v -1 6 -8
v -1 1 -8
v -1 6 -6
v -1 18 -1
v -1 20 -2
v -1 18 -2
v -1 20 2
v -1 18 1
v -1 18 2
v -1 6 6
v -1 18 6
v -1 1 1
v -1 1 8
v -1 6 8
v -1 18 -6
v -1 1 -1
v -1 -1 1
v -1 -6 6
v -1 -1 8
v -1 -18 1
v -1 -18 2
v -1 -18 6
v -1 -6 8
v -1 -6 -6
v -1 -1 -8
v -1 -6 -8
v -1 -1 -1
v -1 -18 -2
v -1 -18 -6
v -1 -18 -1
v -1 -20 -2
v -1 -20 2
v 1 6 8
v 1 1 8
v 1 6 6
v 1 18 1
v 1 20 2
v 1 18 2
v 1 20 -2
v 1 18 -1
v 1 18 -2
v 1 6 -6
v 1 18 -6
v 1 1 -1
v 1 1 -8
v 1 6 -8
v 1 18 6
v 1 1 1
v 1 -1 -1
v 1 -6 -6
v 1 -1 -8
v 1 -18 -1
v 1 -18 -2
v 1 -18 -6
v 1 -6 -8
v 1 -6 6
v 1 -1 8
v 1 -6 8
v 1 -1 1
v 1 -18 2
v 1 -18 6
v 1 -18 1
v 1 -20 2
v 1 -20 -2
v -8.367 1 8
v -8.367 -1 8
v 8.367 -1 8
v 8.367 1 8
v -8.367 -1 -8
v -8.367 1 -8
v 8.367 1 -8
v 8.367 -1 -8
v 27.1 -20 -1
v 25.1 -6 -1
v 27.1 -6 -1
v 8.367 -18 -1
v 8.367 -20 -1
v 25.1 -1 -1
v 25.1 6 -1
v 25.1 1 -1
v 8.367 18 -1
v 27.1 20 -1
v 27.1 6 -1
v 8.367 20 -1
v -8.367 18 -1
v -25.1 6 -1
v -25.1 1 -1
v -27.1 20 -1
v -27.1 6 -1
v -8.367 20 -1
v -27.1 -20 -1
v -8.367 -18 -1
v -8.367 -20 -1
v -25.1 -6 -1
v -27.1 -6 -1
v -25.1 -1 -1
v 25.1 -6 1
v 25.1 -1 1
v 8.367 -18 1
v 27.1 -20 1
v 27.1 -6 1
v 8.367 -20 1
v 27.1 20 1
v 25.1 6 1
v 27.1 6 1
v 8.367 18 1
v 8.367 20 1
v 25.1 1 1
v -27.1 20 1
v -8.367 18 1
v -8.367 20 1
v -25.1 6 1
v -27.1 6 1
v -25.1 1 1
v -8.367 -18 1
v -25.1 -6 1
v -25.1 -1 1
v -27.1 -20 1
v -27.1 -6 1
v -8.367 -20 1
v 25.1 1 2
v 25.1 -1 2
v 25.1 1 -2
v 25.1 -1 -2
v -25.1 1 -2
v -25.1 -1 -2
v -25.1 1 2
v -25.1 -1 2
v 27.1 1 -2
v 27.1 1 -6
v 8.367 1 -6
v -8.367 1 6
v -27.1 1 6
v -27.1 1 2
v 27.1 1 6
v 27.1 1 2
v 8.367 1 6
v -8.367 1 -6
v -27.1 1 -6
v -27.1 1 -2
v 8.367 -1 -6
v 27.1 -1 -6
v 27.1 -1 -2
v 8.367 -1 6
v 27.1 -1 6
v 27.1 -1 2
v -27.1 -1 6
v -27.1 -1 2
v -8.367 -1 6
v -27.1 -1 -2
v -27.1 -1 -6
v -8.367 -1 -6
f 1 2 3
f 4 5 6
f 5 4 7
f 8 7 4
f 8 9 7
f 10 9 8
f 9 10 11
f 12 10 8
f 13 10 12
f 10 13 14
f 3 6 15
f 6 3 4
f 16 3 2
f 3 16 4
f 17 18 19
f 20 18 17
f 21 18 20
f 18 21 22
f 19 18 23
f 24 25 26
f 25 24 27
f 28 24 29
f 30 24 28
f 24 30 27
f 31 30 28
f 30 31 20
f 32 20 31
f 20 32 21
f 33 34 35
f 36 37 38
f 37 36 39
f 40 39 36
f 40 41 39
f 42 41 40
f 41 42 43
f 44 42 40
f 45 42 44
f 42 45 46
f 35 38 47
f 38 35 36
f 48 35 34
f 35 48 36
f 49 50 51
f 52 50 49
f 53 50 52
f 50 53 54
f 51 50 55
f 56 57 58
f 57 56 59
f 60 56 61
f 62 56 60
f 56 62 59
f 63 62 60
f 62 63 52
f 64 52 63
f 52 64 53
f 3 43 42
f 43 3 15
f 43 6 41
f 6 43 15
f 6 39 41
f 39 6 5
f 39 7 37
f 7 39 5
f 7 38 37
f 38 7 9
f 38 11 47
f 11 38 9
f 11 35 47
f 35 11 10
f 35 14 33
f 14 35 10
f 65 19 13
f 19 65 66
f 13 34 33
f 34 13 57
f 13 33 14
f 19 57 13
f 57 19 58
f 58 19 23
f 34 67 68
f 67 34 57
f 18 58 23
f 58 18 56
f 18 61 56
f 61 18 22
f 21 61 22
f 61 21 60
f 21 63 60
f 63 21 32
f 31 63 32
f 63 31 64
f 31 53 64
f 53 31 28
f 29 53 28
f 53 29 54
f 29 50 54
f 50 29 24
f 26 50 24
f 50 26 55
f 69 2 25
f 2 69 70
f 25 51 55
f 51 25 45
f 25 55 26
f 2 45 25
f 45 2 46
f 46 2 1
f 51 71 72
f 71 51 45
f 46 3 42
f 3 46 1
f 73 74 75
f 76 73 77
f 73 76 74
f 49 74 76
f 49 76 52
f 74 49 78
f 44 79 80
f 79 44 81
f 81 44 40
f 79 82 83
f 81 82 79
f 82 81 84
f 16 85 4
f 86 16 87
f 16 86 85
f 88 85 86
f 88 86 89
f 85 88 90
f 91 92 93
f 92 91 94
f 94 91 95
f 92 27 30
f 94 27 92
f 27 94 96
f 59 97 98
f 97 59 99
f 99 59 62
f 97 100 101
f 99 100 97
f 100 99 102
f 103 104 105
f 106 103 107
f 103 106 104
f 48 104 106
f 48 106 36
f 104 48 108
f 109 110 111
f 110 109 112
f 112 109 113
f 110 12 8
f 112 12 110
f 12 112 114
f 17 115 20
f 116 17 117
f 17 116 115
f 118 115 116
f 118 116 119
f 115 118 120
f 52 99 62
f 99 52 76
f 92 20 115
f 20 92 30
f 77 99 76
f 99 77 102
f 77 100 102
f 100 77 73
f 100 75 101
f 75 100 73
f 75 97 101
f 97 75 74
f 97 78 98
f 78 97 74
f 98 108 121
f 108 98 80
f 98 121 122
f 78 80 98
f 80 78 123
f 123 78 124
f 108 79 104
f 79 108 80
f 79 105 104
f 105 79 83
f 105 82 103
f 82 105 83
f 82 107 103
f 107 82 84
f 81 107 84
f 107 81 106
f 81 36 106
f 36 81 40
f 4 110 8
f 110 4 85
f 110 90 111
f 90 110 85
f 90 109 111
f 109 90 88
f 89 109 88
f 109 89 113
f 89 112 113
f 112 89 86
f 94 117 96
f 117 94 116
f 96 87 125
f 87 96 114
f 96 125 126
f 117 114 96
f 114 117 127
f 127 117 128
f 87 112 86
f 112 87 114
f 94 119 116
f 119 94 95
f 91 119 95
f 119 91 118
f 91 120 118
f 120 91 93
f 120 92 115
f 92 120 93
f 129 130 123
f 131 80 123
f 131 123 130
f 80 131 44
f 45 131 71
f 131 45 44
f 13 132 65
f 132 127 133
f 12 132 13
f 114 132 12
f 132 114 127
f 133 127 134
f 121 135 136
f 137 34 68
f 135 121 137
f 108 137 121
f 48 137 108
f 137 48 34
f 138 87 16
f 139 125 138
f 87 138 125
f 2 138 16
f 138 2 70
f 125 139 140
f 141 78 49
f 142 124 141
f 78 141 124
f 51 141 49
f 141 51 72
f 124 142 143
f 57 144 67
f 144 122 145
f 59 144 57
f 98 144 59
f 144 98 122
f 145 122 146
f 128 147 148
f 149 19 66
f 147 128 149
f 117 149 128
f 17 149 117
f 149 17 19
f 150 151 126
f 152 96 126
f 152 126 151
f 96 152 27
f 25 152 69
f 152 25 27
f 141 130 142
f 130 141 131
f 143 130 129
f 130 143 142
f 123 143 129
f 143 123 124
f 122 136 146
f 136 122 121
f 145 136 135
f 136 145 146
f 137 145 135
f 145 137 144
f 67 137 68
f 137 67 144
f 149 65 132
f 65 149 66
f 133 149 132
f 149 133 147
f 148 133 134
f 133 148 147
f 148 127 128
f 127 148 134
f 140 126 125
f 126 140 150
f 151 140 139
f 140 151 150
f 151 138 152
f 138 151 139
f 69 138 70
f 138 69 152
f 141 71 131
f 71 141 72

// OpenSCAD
// file: ../lib/side.scad
module side_top_bottom(inner_x,inner_y,width) {
  x = inner_x/2;
  y = inner_y/2;

  polygon(points=[
      [-x-width,-y-width],
      [-x*1/3,-y-width],
      [-x*1/3,-y],
      [x*1/3,-y],
      [x*1/3,-y-width],
      [x+width,-y-width],
      [x+width,-y*1/3],
      [x,-y*1/3],
      [x,y*1/3],
      [x+width,y*1/3],
      [x+width,y+width],
      [x*1/3,y+width],
      [x*1/3,y],
      [-x*1/3,y],
      [-x*1/3,y+width],
      [-x-width,y+width],
      [-x-width,y*1/3],
      [-x,y*1/3],
      [-x,-y*1/3],
      [-x-width,-y*1/3],
    ],convexity=10);
}

module side_left_right(inner_x,inner_z,width) {
  x = inner_x/2;
  z = inner_z/2;

  polygon(points=[
      [-x-width,-z],
      [-x*1/3,-z],
      [-x*1/3,-z-width],
      [x*1/3,-z-width],
      [x*1/3,-z],
      [x+width,-z],
      [x+width,-z*1/3],
      [x,-z*1/3],
      [x,z*1/3],
      [x+width,z*1/3],
      [x+width,z],
      [x*1/3,z],
      [x*1/3,z+width],
      [-x*1/3,z+width],
      [-x*1/3,z],
      [-x-width,z],
      [-x-width,z*1/3],
      [-x,z*1/3],
      [-x,-z*1/3],
      [-x-width,-z*1/3],
    ],convexity=10);
}


module side_front_back(inner_y,inner_z,width) {
  y = inner_y/2;
  z = inner_z/2;

  polygon(points=[
      [-y,-z],
      [-y*1/3,-z],
      [-y*1/3,-z-width],
      [y*1/3,-z-width],
      [y*1/3,-z],
      [y,-z],
      [y,-z*1/3],
      [y+width,-z*1/3],
      [y+width,z*1/3],
      [y,z*1/3],
      [y,z],
      [y*1/3,z],
      [y*1/3,z+width],
      [-y*1/3,z+width],
      [-y*1/3,z],
      [-y,z],
      [-y,z*1/3],
      [-y-width,z*1/3],
      [-y-width,-z*1/3],
      [-y,-z*1/3],
    ],convexity=10);
}
// file: left.2d.scad
use <../lib/side.scad>

module left() {
  side_left_right(50.2,12,2);
}

left();
// file: top.2d.scad
use <../lib/side.scad>;

module top() {
  side_top_bottom(50.2,36,2);
}

top();
// file: front.2d.scad
use <../lib/side.scad>

module front() {
  side_front_back(36,12,2);
}

front();
// file: left.3d.scad
use <left.2d.scad>;

rotate([90,0,0]) {
  linear_extrude(height = 2, center = true, convexity = 10, twist = 0) {
    left();
  }
}
// file: top.3d.scad
use <top.2d.scad>;

linear_extrude(height = 2, center = true, convexity = 10, twist = 0) {
  top();
}
// file: front.3d.scad
use <front.2d.scad>;

rotate([90,0,90]) {
  linear_extrude(height = 2, center = true, convexity = 10, twist = 0) {
    front();
  }
}
// main file
include <front.3d.scad>
include <top.3d.scad>
include <left.3d.scad>
